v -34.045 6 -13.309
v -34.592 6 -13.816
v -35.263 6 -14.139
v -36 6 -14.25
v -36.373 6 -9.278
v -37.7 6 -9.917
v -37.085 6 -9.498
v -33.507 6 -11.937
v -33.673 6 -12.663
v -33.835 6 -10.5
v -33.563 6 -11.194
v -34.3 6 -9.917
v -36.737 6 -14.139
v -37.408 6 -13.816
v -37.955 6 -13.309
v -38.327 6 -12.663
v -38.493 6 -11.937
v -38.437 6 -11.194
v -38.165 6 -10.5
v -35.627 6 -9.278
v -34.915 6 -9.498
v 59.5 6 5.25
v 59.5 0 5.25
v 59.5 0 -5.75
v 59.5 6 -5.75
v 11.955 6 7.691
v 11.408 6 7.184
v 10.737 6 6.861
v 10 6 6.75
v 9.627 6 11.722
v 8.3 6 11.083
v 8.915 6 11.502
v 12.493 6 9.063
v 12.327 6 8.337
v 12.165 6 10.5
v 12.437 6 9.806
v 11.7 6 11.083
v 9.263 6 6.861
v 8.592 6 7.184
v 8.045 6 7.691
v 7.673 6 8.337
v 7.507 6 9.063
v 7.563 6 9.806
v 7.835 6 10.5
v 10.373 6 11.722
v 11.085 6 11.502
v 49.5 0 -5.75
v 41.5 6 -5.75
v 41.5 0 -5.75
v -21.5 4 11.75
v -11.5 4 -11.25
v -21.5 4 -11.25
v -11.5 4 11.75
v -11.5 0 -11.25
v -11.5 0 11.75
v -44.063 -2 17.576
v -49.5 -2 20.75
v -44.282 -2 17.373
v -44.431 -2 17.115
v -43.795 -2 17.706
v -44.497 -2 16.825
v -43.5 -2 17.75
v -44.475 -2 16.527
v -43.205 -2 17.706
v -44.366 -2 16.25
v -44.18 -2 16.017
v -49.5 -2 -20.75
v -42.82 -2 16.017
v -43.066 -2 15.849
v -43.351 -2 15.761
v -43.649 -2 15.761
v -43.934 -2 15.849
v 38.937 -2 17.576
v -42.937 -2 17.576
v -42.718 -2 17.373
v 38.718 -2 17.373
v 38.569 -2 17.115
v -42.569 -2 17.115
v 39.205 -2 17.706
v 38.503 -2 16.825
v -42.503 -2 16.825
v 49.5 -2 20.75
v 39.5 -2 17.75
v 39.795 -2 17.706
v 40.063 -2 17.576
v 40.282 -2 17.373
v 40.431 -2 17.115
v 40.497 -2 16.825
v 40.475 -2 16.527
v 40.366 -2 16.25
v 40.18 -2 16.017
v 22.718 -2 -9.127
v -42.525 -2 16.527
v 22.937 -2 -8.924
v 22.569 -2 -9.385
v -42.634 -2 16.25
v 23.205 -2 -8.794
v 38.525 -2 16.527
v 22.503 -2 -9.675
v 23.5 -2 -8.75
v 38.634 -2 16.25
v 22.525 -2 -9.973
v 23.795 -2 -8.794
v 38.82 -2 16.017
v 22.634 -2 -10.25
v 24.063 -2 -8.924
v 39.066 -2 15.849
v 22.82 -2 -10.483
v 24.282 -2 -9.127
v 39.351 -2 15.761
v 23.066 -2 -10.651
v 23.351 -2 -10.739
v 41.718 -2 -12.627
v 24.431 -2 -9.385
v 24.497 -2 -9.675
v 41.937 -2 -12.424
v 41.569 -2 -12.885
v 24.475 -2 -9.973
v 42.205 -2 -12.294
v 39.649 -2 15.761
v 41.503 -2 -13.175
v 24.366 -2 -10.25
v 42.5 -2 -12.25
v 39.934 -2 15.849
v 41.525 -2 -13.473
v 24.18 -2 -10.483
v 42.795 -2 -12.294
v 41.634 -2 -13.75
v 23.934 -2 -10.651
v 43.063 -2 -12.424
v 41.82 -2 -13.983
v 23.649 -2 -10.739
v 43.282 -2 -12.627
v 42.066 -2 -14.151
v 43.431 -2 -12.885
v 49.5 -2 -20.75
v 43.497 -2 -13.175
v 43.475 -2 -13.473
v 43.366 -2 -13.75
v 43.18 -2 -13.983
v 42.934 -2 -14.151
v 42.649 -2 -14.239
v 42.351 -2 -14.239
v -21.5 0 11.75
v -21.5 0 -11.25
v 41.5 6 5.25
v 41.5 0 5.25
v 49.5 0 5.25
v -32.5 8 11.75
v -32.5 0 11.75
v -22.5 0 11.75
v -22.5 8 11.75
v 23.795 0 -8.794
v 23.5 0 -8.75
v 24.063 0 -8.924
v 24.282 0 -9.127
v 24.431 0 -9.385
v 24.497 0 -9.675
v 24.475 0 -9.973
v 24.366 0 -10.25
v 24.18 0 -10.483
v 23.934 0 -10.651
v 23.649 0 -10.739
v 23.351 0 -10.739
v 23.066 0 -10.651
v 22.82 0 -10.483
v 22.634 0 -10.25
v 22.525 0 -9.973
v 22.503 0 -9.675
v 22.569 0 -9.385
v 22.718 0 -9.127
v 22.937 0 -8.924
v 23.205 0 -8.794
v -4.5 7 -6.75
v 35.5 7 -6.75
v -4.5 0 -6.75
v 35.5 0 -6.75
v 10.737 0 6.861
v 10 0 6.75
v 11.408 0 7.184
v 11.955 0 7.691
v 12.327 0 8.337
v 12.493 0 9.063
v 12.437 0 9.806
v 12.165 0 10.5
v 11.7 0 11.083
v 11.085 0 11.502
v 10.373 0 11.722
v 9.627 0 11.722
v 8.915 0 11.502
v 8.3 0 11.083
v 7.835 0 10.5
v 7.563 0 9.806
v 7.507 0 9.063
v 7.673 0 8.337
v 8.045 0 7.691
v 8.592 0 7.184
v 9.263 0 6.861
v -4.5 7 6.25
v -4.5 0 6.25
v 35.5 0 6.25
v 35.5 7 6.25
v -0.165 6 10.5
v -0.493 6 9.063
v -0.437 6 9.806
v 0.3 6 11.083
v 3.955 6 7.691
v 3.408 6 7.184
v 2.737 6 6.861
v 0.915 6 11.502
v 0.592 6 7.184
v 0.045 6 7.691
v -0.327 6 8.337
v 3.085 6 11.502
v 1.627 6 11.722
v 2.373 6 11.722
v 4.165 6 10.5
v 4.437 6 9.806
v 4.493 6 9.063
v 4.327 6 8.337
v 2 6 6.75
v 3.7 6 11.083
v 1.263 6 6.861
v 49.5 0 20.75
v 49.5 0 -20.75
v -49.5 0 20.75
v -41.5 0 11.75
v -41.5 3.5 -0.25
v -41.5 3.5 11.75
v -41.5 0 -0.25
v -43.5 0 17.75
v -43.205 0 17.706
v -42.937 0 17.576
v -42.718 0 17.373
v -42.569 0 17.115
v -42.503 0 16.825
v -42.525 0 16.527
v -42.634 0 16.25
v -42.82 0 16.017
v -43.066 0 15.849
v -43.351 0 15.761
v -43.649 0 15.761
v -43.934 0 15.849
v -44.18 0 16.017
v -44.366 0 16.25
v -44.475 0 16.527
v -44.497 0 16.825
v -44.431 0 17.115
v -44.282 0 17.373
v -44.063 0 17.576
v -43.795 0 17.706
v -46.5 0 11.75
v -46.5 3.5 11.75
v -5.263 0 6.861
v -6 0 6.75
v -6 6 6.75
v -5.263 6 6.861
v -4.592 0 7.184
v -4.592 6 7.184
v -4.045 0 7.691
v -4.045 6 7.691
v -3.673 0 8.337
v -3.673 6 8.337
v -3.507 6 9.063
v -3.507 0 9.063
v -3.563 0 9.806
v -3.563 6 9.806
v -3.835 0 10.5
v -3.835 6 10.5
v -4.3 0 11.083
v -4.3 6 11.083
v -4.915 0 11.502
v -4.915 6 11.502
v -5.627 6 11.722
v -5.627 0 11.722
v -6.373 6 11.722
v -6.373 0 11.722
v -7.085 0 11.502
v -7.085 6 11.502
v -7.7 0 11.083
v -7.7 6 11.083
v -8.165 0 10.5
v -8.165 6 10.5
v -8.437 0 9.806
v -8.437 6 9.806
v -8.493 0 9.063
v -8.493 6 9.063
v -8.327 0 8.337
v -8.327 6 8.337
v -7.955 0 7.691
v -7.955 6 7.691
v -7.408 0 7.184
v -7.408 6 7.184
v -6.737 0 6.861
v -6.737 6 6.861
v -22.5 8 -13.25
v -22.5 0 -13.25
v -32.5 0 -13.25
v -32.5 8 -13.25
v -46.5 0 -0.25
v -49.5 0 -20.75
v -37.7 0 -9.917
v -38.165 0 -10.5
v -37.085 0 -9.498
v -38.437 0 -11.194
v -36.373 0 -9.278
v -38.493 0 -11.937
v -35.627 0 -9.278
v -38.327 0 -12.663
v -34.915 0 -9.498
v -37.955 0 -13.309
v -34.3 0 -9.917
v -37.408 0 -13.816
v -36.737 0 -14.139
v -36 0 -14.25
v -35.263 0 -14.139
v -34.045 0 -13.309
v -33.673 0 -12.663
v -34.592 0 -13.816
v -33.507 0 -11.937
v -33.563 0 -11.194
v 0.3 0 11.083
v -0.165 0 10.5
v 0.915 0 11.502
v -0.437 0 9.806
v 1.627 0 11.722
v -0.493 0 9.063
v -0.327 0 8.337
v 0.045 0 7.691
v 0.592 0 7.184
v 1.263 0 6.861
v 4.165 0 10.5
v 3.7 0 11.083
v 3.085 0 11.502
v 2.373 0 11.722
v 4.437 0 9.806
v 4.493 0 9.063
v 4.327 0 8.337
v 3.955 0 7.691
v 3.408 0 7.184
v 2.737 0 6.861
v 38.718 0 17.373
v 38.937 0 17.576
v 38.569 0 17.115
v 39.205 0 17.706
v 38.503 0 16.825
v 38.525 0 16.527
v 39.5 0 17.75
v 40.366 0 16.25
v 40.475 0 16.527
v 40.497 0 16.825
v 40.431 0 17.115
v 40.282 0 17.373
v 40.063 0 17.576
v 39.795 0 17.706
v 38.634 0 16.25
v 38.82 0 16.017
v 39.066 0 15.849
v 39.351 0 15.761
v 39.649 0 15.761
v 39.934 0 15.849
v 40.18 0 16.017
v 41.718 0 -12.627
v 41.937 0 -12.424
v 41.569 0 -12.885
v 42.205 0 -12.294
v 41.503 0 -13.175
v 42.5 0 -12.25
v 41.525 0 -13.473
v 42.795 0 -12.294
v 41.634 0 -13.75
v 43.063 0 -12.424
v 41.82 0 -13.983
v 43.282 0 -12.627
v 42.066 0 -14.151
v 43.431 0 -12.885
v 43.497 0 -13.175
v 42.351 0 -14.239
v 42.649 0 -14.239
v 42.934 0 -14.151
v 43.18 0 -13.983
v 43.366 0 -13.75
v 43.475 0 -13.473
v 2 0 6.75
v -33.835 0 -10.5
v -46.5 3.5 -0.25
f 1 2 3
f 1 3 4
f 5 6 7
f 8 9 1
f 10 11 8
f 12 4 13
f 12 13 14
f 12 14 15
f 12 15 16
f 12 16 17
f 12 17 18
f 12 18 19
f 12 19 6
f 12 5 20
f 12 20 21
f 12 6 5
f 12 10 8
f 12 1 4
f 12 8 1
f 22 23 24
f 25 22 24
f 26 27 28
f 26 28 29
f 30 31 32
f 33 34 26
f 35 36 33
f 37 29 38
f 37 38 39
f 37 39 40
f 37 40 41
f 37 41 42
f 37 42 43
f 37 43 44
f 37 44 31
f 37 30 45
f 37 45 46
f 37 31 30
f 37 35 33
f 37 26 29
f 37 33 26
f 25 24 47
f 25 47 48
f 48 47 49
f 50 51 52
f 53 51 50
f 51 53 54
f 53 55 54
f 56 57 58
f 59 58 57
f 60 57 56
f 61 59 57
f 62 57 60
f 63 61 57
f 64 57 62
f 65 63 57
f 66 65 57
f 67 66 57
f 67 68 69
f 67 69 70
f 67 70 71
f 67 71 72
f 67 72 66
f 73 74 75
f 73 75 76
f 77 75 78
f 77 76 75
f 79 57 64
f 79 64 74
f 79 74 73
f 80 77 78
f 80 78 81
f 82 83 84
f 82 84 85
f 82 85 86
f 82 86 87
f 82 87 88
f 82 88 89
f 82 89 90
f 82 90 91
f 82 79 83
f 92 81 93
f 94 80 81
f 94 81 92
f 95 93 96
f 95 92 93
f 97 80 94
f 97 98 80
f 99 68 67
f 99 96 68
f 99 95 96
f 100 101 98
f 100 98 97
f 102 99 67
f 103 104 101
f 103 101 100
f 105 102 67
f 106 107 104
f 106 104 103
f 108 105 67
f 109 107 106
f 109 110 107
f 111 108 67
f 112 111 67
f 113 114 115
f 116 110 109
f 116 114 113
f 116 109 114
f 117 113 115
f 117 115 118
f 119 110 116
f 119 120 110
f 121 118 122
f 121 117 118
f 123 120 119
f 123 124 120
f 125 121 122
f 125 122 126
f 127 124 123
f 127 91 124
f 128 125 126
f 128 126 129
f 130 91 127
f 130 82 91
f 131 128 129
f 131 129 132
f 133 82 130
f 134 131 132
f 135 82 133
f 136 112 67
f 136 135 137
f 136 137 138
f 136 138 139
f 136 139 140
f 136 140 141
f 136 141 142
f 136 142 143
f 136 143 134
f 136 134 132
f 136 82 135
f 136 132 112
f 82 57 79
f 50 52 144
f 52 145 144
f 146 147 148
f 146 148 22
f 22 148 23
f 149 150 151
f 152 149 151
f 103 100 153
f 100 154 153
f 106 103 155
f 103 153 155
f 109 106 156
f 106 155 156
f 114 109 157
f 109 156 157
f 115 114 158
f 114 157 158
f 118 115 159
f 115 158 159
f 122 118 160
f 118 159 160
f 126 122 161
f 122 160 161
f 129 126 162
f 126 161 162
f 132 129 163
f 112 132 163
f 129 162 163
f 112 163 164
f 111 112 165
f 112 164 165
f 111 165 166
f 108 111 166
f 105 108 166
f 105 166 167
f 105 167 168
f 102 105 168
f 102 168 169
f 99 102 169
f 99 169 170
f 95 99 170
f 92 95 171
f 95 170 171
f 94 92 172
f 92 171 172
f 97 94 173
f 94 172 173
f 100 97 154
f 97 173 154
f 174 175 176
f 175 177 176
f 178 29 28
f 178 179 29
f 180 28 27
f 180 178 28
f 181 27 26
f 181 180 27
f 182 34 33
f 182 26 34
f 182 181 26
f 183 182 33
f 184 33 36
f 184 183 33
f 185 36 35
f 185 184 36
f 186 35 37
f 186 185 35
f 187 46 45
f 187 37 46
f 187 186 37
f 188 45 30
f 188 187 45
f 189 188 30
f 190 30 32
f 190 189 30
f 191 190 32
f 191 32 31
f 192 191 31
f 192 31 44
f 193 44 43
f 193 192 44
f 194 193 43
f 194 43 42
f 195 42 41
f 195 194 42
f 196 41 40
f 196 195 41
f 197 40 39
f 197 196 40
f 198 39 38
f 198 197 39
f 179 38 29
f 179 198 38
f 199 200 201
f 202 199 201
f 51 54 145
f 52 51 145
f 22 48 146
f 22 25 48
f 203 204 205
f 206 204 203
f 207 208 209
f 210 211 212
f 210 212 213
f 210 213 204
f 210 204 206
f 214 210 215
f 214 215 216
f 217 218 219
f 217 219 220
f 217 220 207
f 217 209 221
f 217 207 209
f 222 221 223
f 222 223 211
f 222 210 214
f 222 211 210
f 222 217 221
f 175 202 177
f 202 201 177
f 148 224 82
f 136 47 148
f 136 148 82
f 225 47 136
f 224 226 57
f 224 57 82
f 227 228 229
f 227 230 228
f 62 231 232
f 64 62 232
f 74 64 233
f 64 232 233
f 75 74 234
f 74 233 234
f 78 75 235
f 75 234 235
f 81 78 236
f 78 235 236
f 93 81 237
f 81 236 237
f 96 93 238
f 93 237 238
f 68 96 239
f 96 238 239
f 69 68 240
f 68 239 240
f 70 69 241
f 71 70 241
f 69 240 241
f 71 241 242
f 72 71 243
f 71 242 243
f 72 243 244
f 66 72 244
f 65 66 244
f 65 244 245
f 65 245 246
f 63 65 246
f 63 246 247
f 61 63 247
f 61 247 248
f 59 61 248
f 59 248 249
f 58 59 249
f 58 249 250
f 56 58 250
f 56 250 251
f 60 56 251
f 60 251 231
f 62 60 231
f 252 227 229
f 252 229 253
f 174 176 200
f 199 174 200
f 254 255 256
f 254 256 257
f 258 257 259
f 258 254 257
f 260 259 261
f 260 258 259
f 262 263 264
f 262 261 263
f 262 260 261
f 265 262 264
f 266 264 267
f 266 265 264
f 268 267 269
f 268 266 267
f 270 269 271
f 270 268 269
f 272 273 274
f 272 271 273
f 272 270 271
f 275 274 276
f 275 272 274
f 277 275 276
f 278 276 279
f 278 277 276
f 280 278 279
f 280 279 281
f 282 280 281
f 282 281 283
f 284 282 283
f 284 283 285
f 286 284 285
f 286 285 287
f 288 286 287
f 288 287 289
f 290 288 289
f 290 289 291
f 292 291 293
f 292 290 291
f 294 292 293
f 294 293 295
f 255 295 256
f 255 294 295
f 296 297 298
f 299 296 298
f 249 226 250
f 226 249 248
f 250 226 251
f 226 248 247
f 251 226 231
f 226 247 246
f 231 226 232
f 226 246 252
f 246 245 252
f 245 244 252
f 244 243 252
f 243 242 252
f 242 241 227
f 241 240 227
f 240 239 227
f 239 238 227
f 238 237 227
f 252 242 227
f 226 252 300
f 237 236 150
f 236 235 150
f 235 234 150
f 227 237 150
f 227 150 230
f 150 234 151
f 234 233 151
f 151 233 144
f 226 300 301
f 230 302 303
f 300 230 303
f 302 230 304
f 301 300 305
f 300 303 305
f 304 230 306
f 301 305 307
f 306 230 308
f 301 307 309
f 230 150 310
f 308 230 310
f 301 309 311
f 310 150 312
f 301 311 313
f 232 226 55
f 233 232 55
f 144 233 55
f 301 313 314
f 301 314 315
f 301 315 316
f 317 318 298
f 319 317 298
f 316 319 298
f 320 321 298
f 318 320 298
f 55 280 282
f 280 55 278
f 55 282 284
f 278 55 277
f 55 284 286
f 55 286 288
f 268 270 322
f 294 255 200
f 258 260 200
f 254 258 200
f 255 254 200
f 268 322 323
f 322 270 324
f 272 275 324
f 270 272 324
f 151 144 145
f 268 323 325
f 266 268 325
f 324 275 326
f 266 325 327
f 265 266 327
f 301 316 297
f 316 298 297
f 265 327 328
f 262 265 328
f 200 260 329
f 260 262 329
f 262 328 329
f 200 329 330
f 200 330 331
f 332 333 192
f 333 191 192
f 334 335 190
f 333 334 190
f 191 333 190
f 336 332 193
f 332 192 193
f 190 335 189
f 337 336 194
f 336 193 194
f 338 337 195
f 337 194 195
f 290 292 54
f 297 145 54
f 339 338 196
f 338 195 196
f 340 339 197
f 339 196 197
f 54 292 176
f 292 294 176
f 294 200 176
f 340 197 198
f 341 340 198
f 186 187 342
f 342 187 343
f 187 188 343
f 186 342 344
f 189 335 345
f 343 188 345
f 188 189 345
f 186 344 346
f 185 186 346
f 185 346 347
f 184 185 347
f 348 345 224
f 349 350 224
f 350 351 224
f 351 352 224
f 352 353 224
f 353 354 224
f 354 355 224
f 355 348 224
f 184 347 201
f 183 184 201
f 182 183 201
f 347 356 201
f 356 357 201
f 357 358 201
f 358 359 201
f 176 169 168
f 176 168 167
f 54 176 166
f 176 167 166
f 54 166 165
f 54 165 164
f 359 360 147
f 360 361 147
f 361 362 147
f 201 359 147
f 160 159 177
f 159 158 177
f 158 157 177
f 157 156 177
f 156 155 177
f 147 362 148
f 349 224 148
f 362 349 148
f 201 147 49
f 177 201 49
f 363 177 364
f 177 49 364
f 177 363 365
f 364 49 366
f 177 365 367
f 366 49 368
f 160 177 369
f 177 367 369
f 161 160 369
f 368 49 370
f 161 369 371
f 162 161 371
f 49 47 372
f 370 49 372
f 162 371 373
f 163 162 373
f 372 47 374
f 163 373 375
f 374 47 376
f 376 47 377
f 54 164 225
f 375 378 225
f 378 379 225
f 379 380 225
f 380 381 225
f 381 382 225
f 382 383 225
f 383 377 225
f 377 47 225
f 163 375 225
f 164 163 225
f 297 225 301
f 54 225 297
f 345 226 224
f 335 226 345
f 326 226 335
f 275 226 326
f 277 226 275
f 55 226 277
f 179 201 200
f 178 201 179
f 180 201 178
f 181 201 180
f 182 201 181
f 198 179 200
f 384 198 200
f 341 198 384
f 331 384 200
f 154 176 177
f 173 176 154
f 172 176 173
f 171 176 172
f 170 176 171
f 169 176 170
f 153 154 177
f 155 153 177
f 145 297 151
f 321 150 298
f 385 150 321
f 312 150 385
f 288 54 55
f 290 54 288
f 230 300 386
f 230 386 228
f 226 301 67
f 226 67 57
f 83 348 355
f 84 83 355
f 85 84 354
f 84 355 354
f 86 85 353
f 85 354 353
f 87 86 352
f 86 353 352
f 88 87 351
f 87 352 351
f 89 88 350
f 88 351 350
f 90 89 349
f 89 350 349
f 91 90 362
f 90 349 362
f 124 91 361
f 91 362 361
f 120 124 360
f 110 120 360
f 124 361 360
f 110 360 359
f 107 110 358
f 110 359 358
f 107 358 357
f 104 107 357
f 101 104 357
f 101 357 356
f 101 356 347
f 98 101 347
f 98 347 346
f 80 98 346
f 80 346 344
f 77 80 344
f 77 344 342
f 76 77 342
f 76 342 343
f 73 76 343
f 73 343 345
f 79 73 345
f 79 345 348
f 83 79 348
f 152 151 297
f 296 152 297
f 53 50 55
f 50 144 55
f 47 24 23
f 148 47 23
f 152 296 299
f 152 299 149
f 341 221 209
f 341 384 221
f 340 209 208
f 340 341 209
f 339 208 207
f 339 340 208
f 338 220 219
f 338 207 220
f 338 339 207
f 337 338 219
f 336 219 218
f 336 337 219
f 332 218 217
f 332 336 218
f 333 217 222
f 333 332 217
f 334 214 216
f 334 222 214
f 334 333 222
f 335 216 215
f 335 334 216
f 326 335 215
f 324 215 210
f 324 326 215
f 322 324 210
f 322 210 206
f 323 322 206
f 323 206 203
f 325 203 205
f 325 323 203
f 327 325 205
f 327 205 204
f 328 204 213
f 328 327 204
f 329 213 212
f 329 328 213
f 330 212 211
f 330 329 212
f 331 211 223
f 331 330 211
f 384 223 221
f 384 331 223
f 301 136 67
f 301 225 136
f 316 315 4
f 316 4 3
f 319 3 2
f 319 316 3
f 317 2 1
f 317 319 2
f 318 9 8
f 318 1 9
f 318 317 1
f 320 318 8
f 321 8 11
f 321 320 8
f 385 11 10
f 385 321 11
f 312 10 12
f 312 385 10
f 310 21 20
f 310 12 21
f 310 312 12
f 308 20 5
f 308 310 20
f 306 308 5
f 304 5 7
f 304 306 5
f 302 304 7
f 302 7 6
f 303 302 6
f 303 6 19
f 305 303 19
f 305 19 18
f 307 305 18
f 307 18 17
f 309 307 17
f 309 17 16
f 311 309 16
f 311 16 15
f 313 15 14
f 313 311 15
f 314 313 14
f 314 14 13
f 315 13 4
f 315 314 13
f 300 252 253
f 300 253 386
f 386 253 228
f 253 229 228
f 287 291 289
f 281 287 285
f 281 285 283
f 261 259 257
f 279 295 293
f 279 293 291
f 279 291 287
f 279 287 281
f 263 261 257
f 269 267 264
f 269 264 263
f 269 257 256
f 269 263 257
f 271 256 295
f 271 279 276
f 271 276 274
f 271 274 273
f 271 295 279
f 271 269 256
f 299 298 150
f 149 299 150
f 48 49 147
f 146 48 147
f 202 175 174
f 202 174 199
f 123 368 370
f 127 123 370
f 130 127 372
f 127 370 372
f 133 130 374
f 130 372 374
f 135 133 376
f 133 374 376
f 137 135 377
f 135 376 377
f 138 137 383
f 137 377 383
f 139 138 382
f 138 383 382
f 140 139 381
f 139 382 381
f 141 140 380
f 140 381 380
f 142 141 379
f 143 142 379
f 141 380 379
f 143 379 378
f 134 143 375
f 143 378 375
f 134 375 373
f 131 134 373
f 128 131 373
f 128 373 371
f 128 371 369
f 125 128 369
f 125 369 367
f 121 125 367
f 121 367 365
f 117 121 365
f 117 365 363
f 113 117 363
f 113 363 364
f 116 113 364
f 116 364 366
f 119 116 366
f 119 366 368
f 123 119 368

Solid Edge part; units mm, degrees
sketch "Sketch1" plane through (0, 0, 0) normal (0, -1, 0) x (1, 0, 0)
  line L0 (-47.5, -18.75) -> (47.5, -18.75)
  line L1 (47.5, -18.75) -> (47.5, 18.75)
  line L2 (47.5, 18.75) -> (-47.5, 18.75)
  line L3 (-47.5, 18.75) -> (-47.5, -18.75)
extrude "Ajout_matière_1" add sketch "Sketch1" along normal blind 2
hole "Perçage_1" at (-43.5, 0, 16.75) direction (0, -1, 0) diameter 2 end through all
hole "Hole1" at (42.5, 0, -13.25) direction (0, -1, 0) diameter 2 end through all
hole "Hole2" at (23.5, 0, -9.75) direction (0, -1, 0) diameter 2 end through all
hole "Hole3" at (39.5, 0, 16.75) direction (0, -1, 0) diameter 2 end through all
sketch "Sketch2" plane through (0, 0, 0) normal (0, 1, 0) x (1, 0, 0)
  line L0 (-47.5, 18.75) -> (47.5, 18.75)
  line L1 (47.5, 18.75) -> (47.5, -18.75)
  line L2 (47.5, -18.75) -> (-47.5, -18.75)
  line L3 (-47.5, -18.75) -> (-47.5, 18.75)
  line L4 (-49.5, -20.75) -> (49.5, -20.75)
  line L5 (49.5, -20.75) -> (49.5, 20.75)
  line L6 (49.5, 20.75) -> (-49.5, 20.75)
  line L7 (-49.5, 20.75) -> (-49.5, -20.75)
  dimension "D1" = 99
  dimension "D2" = 41.5
extrude "Ajout_matière_2" add sketch "Sketch2" against normal blind 2
sketch "Sketch3" plane through (0, 0, 0) normal (0, 1, 0) x (1, 0, 0)
  line L0 (-32.5, -11.75) -> (-22.5, -11.75)
  line L1 (-22.5, -11.75) -> (-22.5, 13.25)
  line L2 (-22.5, 13.25) -> (-32.5, 13.25)
  line L3 (-32.5, 13.25) -> (-32.5, -11.75)
  dimension "D1" = 15
  dimension "D2" = 7
  dimension "D3" = 10
  dimension "D4" = 25
extrude "Ajout_matière_3" add sketch "Sketch3" along normal blind 8
sketch "Sketch4" plane through (0, 0, 0) normal (0, 1, 0) x (1, 0, 0)
  line L0 (-21.5, -11.75) -> (-11.5, -11.75)
  line L1 (-11.5, -11.75) -> (-11.5, 11.25)
  line L2 (-11.5, 11.25) -> (-21.5, 11.25)
  line L3 (-21.5, 11.25) -> (-21.5, -11.75)
  dimension "D1" = 26
  dimension "D2" = 7
  dimension "D3" = 23
  dimension "D4" = 10
extrude "Ajout_matière_4" add sketch "Sketch4" along normal blind 4
sketch "Sketch5" plane through (0, 0, 0) normal (0, 1, 0) x (1, 0, 0)
  line L0 (-4.5, -6.25) -> (35.5, -6.25)
  line L1 (35.5, -6.25) -> (35.5, 6.75)
  line L2 (35.5, 6.75) -> (-4.5, 6.75)
  line L3 (-4.5, 6.75) -> (-4.5, -6.25)
  dimension "D1" = 52
  dimension "D2" = 13
  dimension "D3" = 40
  dimension "D4" = 12
extrude "Ajout_matière_5" add sketch "Sketch5" along normal blind 7
sketch "Sketch6" plane through (0, 0, 0) normal (0, 1, 0) x (1, 0, 0)
  line L0 (41.5, -5.25) -> (59.5, -5.25)
  line L1 (59.5, -5.25) -> (59.5, 5.75)
  line L2 (59.5, 5.75) -> (41.5, 5.75)
  line L3 (41.5, 5.75) -> (41.5, -5.25)
  dimension "D1" = 18
  dimension "D2" = 6
  dimension "D3" = 11
  dimension "D4" = 13
extrude "Ajout_matière_6" add sketch "Sketch6" along normal blind 6
sketch "Sketch7" plane through (0, 0, 0) normal (0, 1, 0) x (0, 0, -1)
  line L0 (-11.75, 46.5) -> (0.25, 46.5)
  line L1 (0.25, 46.5) -> (0.25, 41.5)
  line L2 (0.25, 41.5) -> (-11.75, 41.5)
  line L3 (-11.75, 41.5) -> (-11.75, 46.5)
  dimension "D1" = 5
  dimension "D2" = 12
  dimension "D3" = 1
  dimension "D4" = 7
extrude "Ajout_matière_7" add sketch "Sketch7" along normal blind 3.5
sketch "Sketch8" plane through (0, 0, 0) normal (0, 1, 0) x (0, 0, -1)
  circle A0 centre (-9.25, 6) radius 2.5
  circle A1 centre (-9.25, -2) radius 2.5
  circle A2 centre (-9.25, -10) radius 2.5
  circle A3 centre (11.75, 36) radius 2.5
  dimension "D1" = 8
  dimension "D2" = 8
  dimension "D3" = 9.5
  dimension "D4" = 37.5
  dimension "D5" = 11.5
  dimension "D6" = 7
extrude "Ajout_matière_8" add sketch "Sketch8" along normal blind 6
properties material "Epoxy, rigide"
